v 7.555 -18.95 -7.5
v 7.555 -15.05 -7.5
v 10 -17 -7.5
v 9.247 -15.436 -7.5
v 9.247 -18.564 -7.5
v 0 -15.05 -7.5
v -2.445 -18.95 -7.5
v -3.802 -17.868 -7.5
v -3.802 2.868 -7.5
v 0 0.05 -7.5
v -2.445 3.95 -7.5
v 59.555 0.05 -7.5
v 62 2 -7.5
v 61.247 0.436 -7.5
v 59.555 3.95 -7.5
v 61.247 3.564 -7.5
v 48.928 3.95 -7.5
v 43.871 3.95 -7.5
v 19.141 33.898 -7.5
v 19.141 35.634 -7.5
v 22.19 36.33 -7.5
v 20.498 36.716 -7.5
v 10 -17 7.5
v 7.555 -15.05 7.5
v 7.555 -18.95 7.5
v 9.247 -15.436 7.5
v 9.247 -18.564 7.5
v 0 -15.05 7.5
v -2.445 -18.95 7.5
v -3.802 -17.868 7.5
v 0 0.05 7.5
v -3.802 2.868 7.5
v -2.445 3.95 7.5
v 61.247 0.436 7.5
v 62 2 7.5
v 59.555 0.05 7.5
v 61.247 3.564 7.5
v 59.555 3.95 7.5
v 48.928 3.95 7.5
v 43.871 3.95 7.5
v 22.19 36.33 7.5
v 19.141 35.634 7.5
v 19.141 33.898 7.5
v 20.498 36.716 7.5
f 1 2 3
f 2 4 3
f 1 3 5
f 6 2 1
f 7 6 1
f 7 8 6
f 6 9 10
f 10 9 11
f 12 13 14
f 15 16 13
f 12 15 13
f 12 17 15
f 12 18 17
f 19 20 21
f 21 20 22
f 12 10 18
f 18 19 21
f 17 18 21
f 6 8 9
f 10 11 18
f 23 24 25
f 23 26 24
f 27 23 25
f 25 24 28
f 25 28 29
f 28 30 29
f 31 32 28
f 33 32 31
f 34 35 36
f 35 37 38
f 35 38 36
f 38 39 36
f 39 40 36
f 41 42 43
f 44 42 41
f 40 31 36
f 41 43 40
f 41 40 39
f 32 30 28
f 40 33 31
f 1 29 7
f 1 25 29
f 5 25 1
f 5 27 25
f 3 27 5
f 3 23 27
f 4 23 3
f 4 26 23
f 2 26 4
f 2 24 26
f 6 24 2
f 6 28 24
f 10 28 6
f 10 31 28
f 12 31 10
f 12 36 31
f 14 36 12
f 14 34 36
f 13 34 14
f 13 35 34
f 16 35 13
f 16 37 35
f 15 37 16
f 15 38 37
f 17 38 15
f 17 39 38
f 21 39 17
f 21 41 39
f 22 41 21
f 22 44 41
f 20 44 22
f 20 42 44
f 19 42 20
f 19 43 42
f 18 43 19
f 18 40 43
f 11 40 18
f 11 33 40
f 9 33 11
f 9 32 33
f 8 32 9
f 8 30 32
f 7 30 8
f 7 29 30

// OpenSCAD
// file: stand.scad
//CUSTOMIZER VARIABLES

// The width of the stand when looking from the front
stand_width = 50;

// The depth of the spot in which the stood object sits
bottom_depth = 50;

// The height of the stand measured up the backrest
backrest_height = 150;

// The angle that the stood object leans back
lean_angle = 20;

// The distance between the points of contact when the stand is leaned back
base_distance = 100;

// The height at which the stand part intersects with the backrest
join_height = 100;

// The height of the lip
lip_height = 10;

// The thickness of all parts of the stand
structure_thickness = 15;

//CUSTOMIZER VARIABLES END

module stand(width=stand_width, depth=bottom_depth, height=backrest_height, angle=lean_angle, base=base_distance, join=join_height, lip=lip_height, thickness=structure_thickness) {
    linear_extrude(height = width, center = true)
    union() {
        // Backrest
        hull() {
            translate([height-(thickness/2),(thickness/2),0]) circle(d=thickness);
            translate([-(thickness/2),(thickness/2),0]) circle(d=thickness);
        }
        // Stand
        hull() {
            translate([join-(thickness/2),(thickness/2),0]) circle(d=thickness);
            translate([sin(angle) * base - (thickness/2),cos(angle) * base + (thickness/2),0]) circle(d=thickness);
        }
        // Holder
        hull() {
            translate([-(thickness/2),-depth-(thickness/2),0]) circle(d=thickness);
            translate([-(thickness/2),(thickness/2),0])circle(d=thickness);
        }
        // Lip
        hull() {
            translate([-(thickness/2),-depth-(thickness/2),0]) circle(d=thickness);
            translate([lip -(thickness/2),-depth-(thickness/2),0]) circle(d=thickness);
        }
    }
}

stand();
// main file
use <stand.scad>

stand(
    width=15,
    depth=15,
    height=62,
    angle=35,
    base=40,
    join=50,
    lip=10,
    thickness=4
);
